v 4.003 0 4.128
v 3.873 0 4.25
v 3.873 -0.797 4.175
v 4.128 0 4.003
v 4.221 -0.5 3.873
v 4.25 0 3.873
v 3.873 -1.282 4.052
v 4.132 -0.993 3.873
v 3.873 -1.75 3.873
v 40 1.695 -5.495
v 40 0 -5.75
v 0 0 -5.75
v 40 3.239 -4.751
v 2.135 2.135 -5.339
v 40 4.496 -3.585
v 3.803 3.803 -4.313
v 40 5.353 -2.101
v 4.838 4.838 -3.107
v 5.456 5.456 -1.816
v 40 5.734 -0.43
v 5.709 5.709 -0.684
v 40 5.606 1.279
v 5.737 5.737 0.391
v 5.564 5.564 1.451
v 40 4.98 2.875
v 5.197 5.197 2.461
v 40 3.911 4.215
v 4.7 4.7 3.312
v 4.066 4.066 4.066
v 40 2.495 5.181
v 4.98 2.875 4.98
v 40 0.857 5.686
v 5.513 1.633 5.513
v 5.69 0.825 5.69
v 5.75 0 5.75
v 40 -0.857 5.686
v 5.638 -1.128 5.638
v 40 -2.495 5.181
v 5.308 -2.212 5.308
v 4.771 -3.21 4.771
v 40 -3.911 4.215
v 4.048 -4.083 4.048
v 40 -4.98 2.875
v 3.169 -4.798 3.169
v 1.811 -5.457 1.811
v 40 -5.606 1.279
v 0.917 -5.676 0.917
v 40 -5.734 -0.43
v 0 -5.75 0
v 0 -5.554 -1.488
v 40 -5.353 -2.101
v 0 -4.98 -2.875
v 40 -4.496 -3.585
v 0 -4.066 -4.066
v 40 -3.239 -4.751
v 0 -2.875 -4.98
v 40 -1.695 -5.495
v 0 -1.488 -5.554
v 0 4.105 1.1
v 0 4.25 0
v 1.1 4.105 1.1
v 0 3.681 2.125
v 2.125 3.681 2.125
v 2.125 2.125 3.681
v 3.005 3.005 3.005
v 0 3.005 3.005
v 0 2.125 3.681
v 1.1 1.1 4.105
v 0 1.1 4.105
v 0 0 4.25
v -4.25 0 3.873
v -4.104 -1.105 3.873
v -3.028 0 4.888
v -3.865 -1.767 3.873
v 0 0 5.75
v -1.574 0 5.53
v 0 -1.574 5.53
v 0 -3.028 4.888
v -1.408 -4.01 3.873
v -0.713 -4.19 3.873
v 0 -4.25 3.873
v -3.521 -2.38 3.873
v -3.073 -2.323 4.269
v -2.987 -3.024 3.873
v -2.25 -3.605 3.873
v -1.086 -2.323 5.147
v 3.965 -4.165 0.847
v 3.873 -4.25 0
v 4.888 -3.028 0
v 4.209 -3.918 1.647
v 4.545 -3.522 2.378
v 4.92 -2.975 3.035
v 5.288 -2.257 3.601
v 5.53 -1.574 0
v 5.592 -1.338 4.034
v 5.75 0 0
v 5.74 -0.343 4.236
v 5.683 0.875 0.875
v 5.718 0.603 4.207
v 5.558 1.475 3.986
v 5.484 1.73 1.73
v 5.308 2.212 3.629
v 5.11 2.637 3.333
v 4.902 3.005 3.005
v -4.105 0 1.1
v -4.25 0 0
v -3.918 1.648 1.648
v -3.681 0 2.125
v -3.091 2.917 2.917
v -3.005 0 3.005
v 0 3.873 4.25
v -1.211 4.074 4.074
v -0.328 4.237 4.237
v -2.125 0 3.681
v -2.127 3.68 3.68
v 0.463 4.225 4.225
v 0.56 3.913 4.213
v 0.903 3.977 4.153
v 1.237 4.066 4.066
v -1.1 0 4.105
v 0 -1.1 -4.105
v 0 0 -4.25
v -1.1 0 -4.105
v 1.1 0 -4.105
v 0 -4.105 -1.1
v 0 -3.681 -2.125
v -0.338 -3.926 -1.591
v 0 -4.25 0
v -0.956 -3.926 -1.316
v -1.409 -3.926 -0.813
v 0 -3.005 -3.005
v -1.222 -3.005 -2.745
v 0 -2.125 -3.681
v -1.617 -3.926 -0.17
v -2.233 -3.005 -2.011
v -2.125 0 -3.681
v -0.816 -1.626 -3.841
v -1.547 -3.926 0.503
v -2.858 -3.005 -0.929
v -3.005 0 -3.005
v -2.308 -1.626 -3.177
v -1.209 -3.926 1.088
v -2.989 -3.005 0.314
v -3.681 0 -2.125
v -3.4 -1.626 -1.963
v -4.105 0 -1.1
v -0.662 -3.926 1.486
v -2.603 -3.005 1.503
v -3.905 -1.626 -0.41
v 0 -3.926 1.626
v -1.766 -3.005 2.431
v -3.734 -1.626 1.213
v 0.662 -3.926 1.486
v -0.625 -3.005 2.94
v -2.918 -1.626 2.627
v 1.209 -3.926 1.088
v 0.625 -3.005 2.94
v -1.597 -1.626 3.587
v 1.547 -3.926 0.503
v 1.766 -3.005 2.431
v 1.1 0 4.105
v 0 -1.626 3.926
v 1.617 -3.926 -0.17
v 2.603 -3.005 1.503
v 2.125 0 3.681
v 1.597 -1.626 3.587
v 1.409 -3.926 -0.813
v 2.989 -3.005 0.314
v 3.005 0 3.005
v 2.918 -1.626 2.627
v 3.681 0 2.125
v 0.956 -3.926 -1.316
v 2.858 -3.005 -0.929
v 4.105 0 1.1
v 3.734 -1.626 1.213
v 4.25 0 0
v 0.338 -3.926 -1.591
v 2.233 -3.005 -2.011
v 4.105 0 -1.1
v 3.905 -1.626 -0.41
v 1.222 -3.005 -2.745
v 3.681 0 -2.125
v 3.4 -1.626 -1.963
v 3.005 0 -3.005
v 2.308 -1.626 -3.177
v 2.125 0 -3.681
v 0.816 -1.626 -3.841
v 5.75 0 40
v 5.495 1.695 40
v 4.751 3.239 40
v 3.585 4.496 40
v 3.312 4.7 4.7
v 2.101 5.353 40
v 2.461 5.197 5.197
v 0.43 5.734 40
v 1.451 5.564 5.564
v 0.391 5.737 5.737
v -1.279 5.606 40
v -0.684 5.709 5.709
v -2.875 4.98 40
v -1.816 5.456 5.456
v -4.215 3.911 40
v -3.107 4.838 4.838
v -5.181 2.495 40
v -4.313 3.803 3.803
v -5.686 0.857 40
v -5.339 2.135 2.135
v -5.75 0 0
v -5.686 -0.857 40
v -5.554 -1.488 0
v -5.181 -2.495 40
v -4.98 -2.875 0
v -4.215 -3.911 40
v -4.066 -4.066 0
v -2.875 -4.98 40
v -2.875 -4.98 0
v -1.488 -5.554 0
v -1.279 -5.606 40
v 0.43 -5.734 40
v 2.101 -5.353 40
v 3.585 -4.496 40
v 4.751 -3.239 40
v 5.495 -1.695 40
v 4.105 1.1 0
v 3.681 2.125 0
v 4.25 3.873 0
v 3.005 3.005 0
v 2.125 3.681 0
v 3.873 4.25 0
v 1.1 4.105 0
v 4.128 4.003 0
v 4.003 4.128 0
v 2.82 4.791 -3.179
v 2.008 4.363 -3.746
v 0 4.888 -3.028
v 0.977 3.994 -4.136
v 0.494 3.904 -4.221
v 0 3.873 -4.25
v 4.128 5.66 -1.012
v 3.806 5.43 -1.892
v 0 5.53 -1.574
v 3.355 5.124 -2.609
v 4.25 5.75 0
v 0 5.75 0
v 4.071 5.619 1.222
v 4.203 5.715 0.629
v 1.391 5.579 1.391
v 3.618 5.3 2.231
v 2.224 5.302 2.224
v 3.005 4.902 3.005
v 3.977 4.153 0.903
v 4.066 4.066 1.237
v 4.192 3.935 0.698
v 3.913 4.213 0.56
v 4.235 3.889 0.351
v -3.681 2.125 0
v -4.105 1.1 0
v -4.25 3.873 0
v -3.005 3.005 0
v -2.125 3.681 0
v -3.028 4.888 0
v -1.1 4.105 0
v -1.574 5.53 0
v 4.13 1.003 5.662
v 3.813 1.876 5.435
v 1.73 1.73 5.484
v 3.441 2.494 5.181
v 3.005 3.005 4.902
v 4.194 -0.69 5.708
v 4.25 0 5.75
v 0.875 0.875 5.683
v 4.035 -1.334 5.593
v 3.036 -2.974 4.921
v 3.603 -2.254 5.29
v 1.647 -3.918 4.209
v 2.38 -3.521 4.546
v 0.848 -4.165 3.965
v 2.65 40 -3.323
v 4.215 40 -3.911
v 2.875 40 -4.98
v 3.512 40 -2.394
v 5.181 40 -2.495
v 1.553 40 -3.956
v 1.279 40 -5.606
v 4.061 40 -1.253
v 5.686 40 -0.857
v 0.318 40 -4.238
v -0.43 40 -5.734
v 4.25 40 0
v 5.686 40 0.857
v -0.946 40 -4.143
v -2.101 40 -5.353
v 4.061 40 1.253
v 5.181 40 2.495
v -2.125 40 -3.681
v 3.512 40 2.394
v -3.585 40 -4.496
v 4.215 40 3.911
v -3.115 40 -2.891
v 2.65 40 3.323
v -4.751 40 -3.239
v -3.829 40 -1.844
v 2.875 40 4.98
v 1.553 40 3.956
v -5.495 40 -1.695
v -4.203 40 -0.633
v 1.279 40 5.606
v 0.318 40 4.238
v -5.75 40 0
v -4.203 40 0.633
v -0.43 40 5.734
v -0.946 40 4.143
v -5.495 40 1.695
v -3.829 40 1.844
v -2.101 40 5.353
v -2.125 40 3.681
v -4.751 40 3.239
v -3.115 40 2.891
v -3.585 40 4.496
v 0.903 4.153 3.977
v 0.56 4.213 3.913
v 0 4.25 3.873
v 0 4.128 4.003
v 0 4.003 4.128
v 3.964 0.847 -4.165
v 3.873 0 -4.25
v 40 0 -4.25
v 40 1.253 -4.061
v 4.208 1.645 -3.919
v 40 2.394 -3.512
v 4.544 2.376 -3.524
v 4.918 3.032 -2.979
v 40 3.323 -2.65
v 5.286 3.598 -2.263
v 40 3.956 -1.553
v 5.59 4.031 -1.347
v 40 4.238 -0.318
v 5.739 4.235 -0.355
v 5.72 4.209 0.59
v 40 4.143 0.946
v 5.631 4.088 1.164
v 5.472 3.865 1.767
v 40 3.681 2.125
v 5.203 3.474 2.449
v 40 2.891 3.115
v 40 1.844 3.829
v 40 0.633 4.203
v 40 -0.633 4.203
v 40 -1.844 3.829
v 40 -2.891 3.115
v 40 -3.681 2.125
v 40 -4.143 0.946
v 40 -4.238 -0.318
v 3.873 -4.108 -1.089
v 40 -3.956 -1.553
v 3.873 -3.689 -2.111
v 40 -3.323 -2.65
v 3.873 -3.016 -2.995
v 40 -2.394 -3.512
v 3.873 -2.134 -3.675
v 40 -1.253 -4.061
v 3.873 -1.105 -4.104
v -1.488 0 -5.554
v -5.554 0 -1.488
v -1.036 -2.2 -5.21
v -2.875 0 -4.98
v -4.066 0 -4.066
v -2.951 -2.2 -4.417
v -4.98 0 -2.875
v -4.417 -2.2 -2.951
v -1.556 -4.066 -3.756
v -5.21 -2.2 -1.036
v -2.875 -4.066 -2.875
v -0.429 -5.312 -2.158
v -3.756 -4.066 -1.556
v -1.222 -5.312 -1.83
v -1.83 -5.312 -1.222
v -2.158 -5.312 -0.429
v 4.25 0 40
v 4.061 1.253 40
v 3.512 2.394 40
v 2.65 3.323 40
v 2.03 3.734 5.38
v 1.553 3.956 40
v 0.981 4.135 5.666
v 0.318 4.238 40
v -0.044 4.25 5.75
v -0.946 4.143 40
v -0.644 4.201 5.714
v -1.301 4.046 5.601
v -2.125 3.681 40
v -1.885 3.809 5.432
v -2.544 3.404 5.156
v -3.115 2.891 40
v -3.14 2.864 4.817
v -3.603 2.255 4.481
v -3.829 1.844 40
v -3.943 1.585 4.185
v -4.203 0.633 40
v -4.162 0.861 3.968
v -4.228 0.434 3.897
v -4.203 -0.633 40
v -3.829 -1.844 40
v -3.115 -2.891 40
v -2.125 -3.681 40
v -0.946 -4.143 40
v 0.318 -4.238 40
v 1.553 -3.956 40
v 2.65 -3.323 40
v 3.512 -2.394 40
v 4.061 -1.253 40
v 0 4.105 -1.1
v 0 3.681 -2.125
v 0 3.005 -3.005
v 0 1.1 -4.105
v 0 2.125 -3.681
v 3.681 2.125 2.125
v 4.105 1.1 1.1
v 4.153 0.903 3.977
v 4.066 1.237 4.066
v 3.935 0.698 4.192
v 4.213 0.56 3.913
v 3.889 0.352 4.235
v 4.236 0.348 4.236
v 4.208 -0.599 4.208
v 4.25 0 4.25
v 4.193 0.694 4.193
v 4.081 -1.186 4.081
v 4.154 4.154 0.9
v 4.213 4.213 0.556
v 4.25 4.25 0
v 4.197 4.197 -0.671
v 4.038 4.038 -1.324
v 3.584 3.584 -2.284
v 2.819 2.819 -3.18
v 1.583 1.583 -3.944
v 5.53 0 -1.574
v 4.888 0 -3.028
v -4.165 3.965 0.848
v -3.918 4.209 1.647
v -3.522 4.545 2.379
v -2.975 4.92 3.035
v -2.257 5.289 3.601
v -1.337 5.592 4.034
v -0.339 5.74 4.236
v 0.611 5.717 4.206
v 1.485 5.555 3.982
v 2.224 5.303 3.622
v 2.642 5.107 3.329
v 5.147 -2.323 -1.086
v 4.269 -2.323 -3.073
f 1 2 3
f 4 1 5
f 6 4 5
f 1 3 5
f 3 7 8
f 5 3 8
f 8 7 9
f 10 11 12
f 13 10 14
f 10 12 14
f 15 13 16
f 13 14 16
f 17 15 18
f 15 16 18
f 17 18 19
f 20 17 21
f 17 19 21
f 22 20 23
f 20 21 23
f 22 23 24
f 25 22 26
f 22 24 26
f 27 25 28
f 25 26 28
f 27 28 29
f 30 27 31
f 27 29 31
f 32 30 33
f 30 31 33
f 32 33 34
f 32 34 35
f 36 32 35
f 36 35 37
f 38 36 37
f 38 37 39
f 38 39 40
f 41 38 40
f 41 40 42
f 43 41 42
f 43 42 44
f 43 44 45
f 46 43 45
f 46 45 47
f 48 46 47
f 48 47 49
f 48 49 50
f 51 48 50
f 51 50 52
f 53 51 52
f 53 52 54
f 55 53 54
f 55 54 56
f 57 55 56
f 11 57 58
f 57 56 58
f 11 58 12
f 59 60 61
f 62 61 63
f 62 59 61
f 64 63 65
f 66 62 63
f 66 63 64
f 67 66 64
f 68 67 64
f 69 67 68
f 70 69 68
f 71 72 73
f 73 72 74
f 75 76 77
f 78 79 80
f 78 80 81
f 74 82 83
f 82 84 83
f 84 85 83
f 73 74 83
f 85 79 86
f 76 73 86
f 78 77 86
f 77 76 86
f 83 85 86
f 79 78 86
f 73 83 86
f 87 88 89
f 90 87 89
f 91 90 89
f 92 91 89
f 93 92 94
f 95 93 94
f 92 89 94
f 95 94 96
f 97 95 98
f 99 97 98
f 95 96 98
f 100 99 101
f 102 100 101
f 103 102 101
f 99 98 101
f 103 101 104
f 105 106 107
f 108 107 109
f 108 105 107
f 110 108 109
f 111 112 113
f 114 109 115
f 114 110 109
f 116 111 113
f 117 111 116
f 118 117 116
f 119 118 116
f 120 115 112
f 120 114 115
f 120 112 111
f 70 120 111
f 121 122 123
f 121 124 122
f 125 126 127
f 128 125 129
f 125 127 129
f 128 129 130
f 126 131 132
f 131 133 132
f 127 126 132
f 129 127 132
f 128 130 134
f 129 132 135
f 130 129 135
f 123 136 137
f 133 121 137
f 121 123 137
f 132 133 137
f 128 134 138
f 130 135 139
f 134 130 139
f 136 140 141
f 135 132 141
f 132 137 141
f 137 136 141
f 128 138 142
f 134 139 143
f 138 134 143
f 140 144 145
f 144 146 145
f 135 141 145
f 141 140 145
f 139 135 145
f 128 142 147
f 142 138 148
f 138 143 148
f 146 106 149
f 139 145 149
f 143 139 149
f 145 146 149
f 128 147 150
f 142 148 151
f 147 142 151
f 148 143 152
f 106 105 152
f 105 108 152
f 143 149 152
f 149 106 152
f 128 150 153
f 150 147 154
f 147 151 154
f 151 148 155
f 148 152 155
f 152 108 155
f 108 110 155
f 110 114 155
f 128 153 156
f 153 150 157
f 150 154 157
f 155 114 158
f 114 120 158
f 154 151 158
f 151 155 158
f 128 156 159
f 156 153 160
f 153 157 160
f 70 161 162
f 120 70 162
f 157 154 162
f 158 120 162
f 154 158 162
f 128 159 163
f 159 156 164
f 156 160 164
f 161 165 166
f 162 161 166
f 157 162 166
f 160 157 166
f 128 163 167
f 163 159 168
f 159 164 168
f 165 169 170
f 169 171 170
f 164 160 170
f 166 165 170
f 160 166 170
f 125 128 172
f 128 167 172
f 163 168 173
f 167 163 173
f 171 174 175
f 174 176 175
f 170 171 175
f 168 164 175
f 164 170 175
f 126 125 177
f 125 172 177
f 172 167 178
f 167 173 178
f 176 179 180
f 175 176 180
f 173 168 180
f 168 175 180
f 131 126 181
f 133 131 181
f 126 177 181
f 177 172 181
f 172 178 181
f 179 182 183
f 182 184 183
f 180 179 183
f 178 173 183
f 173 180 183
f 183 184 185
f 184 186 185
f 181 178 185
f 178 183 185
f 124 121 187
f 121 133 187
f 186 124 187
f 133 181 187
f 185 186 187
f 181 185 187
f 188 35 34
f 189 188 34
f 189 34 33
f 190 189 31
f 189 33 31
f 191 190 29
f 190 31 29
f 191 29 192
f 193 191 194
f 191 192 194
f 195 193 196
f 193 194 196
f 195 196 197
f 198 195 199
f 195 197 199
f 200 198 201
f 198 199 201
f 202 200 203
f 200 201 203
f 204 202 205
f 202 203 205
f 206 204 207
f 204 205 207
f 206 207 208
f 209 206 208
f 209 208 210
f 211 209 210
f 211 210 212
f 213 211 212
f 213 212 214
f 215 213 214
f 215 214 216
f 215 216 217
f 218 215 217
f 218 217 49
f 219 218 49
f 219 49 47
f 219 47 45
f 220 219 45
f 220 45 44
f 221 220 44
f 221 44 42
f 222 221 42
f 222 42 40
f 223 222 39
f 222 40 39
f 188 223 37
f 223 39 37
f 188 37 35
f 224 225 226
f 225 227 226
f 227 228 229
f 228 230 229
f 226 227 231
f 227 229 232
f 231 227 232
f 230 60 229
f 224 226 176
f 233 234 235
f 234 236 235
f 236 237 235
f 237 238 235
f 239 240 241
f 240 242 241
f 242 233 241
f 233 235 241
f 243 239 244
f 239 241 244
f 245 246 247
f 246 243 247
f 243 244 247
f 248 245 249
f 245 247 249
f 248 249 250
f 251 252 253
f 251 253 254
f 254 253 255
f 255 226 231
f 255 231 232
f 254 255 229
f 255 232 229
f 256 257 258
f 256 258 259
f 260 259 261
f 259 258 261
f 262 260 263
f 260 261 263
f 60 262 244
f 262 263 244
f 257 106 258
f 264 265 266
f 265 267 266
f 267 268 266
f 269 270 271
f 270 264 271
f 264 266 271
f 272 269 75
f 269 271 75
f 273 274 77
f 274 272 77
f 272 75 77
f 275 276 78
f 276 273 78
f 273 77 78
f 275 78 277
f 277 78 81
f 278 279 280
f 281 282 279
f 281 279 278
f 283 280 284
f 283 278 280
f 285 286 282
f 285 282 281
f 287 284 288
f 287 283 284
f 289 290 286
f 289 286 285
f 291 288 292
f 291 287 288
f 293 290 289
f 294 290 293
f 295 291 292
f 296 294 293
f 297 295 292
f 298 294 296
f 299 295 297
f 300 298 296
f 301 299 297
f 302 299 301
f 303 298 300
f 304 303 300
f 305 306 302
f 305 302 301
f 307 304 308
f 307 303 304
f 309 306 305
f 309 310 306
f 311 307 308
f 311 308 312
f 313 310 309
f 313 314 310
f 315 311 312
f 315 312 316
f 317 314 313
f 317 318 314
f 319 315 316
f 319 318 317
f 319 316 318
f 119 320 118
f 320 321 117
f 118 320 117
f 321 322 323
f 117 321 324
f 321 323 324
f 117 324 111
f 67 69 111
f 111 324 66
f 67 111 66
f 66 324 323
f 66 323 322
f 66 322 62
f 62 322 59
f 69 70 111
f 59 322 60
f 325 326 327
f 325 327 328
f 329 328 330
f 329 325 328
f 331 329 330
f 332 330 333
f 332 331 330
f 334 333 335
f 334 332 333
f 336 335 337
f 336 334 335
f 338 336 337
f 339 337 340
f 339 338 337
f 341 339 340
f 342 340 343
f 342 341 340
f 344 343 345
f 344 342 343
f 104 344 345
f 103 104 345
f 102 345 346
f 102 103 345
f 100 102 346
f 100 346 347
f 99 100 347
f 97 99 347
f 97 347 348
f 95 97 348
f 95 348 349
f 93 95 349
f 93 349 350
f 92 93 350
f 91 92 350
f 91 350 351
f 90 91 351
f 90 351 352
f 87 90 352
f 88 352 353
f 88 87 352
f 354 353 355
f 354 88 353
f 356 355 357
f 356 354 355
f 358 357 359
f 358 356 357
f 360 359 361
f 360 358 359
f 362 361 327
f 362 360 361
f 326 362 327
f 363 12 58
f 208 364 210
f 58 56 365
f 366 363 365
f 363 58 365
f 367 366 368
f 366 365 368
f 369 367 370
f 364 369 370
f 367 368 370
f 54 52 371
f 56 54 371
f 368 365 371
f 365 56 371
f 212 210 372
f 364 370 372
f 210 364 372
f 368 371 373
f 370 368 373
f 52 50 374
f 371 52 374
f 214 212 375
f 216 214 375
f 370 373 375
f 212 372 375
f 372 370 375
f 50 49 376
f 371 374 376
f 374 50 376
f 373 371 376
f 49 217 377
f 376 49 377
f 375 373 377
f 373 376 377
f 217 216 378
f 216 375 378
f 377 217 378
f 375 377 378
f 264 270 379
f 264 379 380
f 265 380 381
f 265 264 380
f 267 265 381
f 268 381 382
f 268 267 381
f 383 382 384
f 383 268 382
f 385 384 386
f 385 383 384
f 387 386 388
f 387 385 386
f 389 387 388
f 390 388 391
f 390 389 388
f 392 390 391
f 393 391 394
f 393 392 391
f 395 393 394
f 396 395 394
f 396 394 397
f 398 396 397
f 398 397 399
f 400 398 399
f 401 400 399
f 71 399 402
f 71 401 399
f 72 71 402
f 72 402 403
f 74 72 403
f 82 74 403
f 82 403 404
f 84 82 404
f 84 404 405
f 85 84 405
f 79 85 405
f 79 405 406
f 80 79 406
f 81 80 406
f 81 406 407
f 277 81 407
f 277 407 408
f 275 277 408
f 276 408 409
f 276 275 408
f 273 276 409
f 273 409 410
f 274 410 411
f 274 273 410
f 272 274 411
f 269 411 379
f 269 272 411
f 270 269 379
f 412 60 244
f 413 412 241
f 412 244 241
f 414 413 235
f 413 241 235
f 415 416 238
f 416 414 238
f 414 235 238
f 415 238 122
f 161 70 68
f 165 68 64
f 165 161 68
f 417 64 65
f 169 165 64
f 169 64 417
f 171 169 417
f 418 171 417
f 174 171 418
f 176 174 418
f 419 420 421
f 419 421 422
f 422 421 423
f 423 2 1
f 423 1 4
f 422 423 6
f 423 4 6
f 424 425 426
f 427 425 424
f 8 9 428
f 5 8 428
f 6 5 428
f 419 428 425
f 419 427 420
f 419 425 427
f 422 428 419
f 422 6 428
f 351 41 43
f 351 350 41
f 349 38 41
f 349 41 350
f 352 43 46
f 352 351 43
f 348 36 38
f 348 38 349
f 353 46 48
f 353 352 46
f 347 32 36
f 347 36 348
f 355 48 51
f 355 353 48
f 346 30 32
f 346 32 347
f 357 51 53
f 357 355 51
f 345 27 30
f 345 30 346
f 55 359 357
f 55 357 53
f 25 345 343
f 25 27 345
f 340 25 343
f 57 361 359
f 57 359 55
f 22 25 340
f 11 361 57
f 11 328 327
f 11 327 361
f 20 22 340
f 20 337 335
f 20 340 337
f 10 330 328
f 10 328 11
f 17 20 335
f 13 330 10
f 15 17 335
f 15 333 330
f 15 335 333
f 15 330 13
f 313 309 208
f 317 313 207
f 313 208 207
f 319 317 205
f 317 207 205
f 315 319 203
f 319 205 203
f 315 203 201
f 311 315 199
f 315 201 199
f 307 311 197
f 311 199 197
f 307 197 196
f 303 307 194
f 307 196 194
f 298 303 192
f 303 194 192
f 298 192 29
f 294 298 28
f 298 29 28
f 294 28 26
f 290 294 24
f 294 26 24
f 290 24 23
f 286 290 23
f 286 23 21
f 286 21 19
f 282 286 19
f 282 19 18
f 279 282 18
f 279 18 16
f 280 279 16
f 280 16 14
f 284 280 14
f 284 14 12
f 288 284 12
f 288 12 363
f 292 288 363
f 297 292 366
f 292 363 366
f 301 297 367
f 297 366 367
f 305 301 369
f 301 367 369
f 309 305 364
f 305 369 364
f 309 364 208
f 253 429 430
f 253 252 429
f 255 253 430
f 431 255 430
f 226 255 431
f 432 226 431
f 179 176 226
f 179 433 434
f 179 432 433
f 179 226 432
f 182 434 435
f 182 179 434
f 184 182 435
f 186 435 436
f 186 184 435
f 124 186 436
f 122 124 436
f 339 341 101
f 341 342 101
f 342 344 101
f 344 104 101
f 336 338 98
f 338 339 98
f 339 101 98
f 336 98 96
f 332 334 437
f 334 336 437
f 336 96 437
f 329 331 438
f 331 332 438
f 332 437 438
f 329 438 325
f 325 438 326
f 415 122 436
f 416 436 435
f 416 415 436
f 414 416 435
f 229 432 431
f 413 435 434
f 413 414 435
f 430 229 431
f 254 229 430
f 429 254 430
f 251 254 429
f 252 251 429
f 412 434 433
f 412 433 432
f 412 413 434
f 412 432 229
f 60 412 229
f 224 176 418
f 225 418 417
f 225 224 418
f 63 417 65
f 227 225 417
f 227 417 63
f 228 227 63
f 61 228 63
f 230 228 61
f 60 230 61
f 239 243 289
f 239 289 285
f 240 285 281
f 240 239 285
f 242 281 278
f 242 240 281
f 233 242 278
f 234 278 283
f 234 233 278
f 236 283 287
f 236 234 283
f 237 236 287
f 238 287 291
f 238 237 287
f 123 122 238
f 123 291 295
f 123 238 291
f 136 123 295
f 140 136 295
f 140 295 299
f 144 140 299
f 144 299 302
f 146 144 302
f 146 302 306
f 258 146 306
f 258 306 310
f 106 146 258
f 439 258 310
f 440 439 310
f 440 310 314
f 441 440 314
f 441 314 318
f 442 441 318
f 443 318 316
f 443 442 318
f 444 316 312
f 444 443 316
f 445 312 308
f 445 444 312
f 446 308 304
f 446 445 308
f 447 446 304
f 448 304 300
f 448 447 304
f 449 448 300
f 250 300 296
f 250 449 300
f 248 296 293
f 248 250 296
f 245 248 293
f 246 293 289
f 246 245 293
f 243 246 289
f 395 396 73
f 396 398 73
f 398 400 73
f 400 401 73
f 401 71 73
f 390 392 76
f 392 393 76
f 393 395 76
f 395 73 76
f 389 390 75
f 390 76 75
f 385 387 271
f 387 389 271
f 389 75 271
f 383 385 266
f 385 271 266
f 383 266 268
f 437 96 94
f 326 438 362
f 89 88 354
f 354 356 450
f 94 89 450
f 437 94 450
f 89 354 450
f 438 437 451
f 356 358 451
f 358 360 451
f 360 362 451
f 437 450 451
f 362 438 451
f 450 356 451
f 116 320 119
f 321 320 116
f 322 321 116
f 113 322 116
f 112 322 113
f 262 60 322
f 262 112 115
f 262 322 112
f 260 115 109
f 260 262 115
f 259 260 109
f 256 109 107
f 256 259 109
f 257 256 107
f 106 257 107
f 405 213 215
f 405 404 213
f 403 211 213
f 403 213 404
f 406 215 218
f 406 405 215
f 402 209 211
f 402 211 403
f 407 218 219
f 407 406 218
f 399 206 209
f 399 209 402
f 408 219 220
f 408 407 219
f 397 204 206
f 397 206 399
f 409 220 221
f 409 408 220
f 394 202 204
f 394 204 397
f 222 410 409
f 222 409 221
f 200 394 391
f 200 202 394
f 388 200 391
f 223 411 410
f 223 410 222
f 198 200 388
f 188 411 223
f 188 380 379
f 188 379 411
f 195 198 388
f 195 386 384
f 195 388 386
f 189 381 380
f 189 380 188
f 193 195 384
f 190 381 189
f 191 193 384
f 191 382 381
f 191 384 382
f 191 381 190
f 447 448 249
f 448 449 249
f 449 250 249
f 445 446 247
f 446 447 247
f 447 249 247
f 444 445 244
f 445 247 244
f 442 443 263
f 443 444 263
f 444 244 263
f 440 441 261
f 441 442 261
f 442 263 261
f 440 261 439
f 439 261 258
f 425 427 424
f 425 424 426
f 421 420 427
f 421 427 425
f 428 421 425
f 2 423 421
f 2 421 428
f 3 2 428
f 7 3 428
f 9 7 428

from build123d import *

# Parameters (mm, degrees)
SKETCH_1_R      = 5.75
SKETCH_1_R_2    = 4.25
EXTRUDE_1_DEPTH = 40
SKETCH_2_R      = 5.75
SKETCH_2_R_2    = 4.25
EXTRUDE_2_DEPTH = 40
SKETCH_3_R      = 5.75
SKETCH_3_R_2    = 4.25
EXTRUDE_3_DEPTH = 40


with BuildPart() as part:
    # 草图1 → 凸台-拉伸1 (new body)
    with BuildSketch(Plane.XY):
        Circle(SKETCH_1_R)
        Circle(SKETCH_1_R_2, mode=Mode.SUBTRACT)
    extrude(amount=EXTRUDE_1_DEPTH)

    # 草图2 → 凸台-拉伸2 (add)
    with BuildSketch(Plane(origin=(0, 0, 0), x_dir=(1, 0, 0), z_dir=(0, 1, 0))):
        with Locations(Location((0, 0, 0), (0, 0, 180))):
            Circle(SKETCH_2_R)
        Circle(SKETCH_2_R_2, mode=Mode.SUBTRACT)
    extrude(amount=EXTRUDE_2_DEPTH)

    # 草图3 → 凸台-拉伸3 (add)
    with BuildSketch(Plane(origin=(0, 0, 0), x_dir=(0, 0, -1), z_dir=(1, 0, 0))):
        Circle(SKETCH_3_R)
        Circle(SKETCH_3_R_2, mode=Mode.SUBTRACT)
    extrude(amount=EXTRUDE_3_DEPTH)

    # 草图4 → 旋转1 (revolve)
    with BuildSketch(Plane(origin=(0, 0, 0), x_dir=(-1, 0, 0), z_dir=(0, 0, -1)), mode=Mode.PRIVATE) as revolve_1_sk:
        with BuildLine():
            Line((4.25, 0), (5.75, 0))
            ThreePointArc((5.75, 0), (4.065863992, -4.065863992), (0, -5.75))
            Line((0, -5.75), (0, -4.25))
            ThreePointArc((0, -4.25), (3.00520382, -3.00520382), (4.25, 0))
        make_face()
    revolve(revolve_1_sk.sketch.rotate(Axis((0, -4.25, 0), (0, 1, 0)), 270), axis=Axis((0, -4.25, 0), (0, 1, 0)))


solid = part.part
